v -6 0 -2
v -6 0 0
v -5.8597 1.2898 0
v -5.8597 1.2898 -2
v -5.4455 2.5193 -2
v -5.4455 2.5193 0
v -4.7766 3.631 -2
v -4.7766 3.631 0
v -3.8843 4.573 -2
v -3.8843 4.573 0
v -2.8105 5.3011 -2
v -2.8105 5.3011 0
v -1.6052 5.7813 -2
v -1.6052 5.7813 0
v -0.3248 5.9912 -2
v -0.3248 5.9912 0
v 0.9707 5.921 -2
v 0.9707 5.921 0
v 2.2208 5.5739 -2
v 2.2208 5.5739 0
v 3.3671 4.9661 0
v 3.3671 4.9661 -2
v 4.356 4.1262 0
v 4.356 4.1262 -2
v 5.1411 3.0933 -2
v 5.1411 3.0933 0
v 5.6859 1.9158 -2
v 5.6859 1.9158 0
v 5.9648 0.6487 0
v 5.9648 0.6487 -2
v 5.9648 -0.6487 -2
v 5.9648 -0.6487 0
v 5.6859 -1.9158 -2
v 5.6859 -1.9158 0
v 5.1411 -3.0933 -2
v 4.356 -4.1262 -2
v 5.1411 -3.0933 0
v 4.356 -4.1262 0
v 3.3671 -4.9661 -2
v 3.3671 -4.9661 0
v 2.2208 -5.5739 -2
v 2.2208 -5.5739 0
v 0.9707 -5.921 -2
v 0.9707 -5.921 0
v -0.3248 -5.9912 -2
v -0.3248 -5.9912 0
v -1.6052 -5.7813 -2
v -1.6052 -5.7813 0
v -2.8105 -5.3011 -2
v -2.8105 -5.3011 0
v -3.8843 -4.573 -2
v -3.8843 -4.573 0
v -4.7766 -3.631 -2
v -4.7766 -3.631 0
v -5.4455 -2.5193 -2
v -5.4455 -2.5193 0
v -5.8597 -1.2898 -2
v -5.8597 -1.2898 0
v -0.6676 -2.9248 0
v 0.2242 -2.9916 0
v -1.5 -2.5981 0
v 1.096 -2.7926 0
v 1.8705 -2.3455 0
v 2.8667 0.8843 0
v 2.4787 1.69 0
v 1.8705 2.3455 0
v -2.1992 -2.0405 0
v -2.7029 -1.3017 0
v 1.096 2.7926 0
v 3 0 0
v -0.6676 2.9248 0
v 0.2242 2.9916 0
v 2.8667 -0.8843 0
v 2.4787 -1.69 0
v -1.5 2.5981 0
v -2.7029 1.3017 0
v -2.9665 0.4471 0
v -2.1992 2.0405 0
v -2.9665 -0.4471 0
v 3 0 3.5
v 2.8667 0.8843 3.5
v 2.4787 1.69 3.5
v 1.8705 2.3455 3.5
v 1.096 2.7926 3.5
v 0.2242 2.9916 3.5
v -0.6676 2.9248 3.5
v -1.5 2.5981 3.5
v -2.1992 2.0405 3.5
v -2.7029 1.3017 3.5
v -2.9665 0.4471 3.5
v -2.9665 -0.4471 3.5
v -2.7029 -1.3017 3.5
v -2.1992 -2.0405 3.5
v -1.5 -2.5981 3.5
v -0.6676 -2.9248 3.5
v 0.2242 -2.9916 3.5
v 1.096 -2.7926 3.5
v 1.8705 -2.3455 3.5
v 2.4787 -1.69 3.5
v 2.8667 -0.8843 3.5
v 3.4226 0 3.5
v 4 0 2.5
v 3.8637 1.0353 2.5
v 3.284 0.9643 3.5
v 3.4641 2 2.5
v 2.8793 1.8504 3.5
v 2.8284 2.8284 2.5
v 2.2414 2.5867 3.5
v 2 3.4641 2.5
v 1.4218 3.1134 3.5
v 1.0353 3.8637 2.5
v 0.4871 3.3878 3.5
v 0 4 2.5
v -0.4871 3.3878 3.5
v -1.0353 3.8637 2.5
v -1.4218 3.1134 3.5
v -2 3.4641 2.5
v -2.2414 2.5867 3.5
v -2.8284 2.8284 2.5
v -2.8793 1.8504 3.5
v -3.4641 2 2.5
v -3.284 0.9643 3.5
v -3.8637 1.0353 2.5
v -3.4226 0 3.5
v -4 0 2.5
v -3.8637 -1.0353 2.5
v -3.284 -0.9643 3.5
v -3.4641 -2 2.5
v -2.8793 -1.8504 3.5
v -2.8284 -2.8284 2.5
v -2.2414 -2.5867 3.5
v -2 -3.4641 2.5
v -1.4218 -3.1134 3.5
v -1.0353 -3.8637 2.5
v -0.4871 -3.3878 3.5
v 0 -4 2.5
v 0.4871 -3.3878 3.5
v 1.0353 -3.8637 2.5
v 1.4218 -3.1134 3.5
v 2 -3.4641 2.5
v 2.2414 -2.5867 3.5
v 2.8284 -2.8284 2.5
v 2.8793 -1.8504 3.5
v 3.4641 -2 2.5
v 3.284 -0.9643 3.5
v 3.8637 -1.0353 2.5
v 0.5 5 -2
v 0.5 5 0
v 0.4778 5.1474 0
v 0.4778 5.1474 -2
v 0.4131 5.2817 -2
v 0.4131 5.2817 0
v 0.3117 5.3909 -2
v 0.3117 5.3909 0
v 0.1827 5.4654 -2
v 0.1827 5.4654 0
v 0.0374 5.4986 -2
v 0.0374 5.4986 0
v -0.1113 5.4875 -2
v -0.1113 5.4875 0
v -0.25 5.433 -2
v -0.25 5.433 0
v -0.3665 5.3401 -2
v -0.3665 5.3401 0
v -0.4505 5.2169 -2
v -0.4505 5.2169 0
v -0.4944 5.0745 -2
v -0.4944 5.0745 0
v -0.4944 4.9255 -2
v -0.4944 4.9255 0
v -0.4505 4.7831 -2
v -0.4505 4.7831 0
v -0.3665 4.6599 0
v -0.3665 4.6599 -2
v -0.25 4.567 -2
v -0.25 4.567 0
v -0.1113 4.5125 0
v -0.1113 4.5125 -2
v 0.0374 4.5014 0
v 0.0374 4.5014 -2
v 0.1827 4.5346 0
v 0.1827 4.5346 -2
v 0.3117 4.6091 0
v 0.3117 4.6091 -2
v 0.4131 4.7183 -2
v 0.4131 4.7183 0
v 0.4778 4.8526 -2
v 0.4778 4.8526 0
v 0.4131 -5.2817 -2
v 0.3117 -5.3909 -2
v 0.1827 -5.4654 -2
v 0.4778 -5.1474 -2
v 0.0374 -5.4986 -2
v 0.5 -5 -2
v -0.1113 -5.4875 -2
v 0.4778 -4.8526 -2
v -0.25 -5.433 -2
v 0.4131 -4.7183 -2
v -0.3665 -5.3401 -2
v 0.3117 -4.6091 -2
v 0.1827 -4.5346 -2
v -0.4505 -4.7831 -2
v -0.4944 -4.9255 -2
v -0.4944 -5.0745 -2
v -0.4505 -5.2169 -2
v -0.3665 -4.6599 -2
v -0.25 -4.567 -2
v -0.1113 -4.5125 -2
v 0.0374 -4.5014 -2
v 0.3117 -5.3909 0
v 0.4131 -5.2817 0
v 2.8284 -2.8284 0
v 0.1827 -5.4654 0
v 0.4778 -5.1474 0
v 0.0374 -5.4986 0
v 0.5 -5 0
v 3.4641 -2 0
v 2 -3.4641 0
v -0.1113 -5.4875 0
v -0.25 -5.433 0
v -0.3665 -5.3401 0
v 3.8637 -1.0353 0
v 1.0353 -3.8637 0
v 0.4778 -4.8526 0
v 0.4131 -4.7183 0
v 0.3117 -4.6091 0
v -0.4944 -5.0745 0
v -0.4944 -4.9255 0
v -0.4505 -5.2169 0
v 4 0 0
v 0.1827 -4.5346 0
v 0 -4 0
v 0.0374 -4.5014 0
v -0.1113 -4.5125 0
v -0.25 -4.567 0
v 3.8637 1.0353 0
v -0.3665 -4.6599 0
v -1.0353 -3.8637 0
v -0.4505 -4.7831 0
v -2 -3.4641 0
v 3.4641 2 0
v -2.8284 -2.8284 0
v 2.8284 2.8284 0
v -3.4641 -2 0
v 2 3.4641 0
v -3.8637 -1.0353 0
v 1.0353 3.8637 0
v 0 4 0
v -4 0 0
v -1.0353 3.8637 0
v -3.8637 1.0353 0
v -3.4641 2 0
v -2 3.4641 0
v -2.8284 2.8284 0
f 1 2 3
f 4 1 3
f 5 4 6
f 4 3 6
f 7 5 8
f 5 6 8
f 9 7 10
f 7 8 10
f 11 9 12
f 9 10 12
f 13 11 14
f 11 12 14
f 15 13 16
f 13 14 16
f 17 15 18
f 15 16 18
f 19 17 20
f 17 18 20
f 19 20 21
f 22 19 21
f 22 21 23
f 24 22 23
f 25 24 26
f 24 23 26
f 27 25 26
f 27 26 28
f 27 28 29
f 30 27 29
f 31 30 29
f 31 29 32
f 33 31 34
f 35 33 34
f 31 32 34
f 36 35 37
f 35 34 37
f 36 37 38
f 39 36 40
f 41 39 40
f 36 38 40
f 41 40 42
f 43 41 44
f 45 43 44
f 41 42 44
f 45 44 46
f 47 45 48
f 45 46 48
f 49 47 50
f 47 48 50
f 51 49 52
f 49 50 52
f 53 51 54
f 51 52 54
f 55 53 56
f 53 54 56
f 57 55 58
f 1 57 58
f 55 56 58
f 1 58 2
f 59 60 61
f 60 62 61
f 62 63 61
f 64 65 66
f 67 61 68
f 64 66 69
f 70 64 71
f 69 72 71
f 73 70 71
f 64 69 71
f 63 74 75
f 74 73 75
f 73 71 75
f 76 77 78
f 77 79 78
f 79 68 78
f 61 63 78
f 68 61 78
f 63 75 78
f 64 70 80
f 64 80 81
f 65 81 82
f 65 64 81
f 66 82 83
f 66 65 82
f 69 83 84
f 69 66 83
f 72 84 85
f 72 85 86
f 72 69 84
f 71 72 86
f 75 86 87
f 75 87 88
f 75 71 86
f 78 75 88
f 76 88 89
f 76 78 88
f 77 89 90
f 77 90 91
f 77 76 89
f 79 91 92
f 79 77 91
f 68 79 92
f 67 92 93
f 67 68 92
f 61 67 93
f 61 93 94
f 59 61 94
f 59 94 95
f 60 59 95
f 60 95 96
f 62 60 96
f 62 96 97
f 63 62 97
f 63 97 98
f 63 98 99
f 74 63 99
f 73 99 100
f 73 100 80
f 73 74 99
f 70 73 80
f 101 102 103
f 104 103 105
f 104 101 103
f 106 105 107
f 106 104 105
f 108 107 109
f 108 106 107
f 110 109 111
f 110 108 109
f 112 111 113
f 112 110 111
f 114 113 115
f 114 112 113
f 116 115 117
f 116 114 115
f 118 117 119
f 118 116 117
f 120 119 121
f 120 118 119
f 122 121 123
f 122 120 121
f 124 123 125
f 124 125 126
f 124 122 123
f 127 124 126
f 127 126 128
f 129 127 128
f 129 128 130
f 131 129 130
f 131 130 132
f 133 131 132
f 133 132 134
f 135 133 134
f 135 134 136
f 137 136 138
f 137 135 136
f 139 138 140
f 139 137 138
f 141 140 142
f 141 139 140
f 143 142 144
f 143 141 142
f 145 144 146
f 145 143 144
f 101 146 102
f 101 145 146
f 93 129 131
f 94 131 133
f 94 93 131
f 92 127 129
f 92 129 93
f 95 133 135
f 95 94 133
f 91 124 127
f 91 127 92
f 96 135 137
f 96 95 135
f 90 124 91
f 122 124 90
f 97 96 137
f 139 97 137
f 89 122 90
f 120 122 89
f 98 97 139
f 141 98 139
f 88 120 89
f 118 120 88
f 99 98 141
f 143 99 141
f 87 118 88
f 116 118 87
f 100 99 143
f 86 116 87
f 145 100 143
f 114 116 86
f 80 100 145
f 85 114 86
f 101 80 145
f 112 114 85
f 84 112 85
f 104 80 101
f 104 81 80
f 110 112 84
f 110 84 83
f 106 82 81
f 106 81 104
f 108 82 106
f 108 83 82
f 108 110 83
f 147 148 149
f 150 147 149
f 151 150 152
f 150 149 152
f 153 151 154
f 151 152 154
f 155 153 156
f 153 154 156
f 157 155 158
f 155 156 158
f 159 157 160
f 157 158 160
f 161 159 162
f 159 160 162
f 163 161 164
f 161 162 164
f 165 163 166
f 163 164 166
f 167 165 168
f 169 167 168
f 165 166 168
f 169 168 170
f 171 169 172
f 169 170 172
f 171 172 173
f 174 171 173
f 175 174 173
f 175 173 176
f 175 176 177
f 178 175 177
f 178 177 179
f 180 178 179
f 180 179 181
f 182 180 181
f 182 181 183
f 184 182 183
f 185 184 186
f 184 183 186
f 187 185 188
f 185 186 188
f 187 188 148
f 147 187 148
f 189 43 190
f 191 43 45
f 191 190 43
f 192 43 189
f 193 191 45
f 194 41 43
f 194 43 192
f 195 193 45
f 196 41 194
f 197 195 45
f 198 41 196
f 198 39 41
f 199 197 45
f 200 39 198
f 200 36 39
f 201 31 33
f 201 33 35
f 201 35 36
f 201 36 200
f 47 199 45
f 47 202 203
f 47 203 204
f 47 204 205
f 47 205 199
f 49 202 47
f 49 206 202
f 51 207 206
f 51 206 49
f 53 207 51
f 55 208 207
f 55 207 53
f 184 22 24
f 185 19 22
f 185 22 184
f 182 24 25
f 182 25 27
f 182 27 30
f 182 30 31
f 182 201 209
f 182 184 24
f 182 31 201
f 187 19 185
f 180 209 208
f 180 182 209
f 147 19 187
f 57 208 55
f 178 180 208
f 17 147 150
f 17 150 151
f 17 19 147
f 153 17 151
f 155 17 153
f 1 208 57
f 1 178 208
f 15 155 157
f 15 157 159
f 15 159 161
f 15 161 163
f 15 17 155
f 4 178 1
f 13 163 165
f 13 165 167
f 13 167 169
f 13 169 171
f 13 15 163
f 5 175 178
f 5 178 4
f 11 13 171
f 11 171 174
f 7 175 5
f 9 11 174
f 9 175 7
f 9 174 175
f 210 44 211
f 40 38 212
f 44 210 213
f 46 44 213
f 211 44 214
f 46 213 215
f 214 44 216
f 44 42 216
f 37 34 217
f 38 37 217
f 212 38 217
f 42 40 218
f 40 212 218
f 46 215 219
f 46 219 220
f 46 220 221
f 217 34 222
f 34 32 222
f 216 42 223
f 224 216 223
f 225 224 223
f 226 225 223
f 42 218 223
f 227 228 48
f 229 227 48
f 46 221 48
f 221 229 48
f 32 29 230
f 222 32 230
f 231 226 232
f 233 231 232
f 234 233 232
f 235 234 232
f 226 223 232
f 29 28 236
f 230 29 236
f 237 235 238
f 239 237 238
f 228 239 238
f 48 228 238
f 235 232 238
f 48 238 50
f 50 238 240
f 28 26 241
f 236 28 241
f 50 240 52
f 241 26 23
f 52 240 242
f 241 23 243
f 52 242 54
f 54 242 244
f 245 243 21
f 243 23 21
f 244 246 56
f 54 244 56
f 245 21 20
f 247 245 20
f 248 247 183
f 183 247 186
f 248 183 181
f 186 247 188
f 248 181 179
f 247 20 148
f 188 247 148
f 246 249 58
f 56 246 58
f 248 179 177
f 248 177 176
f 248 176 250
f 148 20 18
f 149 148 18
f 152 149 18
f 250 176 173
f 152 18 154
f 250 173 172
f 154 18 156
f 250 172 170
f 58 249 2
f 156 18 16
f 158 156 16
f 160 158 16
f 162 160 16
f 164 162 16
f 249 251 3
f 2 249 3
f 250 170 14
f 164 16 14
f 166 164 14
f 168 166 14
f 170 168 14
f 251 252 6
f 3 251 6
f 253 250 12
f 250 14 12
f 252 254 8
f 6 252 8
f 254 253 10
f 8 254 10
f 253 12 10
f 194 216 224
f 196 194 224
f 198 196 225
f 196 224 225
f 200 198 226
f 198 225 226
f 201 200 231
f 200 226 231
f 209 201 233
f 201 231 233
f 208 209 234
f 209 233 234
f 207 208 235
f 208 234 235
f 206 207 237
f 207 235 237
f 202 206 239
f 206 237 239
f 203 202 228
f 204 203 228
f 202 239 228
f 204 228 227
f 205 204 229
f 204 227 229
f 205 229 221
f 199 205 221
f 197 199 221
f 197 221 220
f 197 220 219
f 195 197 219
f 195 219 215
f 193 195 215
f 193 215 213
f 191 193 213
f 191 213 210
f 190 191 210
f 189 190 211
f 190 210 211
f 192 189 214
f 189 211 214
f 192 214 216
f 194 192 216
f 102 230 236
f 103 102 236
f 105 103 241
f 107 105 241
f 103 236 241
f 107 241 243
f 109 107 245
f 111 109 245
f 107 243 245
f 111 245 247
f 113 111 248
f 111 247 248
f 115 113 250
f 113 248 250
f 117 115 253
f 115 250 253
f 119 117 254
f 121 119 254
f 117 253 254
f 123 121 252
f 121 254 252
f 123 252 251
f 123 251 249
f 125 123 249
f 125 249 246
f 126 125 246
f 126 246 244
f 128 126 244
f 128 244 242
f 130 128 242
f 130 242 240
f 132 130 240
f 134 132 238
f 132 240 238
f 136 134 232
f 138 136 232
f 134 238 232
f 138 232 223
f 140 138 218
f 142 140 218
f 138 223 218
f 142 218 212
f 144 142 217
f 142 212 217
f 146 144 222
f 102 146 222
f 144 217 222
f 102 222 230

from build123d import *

# Parameters (mm, degrees)
SKETCH1_R           = 4
SKETCH1_R_2         = 3
BOSS_EXTRUDE1_DEPTH = 3.5
CHAMFER1_SIZE       = 1
CHAMFER1_SIZE2      = 0.577350269
SKETCH2_R           = 6
BOSS_EXTRUDE2_DEPTH = 2
SKETCH3_R           = 0.5
CUT_EXTRUDE1_DEPTH  = 2


with BuildPart() as part:
    # Sketch1 → Boss-Extrude1 (new body)
    with BuildSketch(Plane.XY):
        Circle(SKETCH1_R)
        Circle(SKETCH1_R_2, mode=Mode.SUBTRACT)
    extrude(amount=BOSS_EXTRUDE1_DEPTH)

    # Chamfer1
    chamfer1_edges = [part.edges().sort_by_distance(p)[0] for p in [
        (-4, 0, 3.5),
    ]]
    chamfer1_side = [part.faces().sort_by_distance(p)[0] for p in [
        (-4, 0, 1.75),
    ]]
    chamfer(chamfer1_edges, length=CHAMFER1_SIZE, length2=CHAMFER1_SIZE2, reference=chamfer1_side[0])

    # Sketch2 → Boss-Extrude2 (add)
    with BuildSketch(Plane(origin=(0, 0, 0), x_dir=(-1, 0, 0), z_dir=(0, 0, -1))):
        Circle(SKETCH2_R)
    extrude(amount=BOSS_EXTRUDE2_DEPTH)

    # Sketch3 → Cut-Extrude1 (cut)
    with BuildSketch(Plane.XY):
        with Locations((0, 5)):
            Circle(SKETCH3_R)
        with Locations((0, -5)):
            Circle(SKETCH3_R)
    extrude(amount=-CUT_EXTRUDE1_DEPTH, mode=Mode.SUBTRACT)


solid = part.part
